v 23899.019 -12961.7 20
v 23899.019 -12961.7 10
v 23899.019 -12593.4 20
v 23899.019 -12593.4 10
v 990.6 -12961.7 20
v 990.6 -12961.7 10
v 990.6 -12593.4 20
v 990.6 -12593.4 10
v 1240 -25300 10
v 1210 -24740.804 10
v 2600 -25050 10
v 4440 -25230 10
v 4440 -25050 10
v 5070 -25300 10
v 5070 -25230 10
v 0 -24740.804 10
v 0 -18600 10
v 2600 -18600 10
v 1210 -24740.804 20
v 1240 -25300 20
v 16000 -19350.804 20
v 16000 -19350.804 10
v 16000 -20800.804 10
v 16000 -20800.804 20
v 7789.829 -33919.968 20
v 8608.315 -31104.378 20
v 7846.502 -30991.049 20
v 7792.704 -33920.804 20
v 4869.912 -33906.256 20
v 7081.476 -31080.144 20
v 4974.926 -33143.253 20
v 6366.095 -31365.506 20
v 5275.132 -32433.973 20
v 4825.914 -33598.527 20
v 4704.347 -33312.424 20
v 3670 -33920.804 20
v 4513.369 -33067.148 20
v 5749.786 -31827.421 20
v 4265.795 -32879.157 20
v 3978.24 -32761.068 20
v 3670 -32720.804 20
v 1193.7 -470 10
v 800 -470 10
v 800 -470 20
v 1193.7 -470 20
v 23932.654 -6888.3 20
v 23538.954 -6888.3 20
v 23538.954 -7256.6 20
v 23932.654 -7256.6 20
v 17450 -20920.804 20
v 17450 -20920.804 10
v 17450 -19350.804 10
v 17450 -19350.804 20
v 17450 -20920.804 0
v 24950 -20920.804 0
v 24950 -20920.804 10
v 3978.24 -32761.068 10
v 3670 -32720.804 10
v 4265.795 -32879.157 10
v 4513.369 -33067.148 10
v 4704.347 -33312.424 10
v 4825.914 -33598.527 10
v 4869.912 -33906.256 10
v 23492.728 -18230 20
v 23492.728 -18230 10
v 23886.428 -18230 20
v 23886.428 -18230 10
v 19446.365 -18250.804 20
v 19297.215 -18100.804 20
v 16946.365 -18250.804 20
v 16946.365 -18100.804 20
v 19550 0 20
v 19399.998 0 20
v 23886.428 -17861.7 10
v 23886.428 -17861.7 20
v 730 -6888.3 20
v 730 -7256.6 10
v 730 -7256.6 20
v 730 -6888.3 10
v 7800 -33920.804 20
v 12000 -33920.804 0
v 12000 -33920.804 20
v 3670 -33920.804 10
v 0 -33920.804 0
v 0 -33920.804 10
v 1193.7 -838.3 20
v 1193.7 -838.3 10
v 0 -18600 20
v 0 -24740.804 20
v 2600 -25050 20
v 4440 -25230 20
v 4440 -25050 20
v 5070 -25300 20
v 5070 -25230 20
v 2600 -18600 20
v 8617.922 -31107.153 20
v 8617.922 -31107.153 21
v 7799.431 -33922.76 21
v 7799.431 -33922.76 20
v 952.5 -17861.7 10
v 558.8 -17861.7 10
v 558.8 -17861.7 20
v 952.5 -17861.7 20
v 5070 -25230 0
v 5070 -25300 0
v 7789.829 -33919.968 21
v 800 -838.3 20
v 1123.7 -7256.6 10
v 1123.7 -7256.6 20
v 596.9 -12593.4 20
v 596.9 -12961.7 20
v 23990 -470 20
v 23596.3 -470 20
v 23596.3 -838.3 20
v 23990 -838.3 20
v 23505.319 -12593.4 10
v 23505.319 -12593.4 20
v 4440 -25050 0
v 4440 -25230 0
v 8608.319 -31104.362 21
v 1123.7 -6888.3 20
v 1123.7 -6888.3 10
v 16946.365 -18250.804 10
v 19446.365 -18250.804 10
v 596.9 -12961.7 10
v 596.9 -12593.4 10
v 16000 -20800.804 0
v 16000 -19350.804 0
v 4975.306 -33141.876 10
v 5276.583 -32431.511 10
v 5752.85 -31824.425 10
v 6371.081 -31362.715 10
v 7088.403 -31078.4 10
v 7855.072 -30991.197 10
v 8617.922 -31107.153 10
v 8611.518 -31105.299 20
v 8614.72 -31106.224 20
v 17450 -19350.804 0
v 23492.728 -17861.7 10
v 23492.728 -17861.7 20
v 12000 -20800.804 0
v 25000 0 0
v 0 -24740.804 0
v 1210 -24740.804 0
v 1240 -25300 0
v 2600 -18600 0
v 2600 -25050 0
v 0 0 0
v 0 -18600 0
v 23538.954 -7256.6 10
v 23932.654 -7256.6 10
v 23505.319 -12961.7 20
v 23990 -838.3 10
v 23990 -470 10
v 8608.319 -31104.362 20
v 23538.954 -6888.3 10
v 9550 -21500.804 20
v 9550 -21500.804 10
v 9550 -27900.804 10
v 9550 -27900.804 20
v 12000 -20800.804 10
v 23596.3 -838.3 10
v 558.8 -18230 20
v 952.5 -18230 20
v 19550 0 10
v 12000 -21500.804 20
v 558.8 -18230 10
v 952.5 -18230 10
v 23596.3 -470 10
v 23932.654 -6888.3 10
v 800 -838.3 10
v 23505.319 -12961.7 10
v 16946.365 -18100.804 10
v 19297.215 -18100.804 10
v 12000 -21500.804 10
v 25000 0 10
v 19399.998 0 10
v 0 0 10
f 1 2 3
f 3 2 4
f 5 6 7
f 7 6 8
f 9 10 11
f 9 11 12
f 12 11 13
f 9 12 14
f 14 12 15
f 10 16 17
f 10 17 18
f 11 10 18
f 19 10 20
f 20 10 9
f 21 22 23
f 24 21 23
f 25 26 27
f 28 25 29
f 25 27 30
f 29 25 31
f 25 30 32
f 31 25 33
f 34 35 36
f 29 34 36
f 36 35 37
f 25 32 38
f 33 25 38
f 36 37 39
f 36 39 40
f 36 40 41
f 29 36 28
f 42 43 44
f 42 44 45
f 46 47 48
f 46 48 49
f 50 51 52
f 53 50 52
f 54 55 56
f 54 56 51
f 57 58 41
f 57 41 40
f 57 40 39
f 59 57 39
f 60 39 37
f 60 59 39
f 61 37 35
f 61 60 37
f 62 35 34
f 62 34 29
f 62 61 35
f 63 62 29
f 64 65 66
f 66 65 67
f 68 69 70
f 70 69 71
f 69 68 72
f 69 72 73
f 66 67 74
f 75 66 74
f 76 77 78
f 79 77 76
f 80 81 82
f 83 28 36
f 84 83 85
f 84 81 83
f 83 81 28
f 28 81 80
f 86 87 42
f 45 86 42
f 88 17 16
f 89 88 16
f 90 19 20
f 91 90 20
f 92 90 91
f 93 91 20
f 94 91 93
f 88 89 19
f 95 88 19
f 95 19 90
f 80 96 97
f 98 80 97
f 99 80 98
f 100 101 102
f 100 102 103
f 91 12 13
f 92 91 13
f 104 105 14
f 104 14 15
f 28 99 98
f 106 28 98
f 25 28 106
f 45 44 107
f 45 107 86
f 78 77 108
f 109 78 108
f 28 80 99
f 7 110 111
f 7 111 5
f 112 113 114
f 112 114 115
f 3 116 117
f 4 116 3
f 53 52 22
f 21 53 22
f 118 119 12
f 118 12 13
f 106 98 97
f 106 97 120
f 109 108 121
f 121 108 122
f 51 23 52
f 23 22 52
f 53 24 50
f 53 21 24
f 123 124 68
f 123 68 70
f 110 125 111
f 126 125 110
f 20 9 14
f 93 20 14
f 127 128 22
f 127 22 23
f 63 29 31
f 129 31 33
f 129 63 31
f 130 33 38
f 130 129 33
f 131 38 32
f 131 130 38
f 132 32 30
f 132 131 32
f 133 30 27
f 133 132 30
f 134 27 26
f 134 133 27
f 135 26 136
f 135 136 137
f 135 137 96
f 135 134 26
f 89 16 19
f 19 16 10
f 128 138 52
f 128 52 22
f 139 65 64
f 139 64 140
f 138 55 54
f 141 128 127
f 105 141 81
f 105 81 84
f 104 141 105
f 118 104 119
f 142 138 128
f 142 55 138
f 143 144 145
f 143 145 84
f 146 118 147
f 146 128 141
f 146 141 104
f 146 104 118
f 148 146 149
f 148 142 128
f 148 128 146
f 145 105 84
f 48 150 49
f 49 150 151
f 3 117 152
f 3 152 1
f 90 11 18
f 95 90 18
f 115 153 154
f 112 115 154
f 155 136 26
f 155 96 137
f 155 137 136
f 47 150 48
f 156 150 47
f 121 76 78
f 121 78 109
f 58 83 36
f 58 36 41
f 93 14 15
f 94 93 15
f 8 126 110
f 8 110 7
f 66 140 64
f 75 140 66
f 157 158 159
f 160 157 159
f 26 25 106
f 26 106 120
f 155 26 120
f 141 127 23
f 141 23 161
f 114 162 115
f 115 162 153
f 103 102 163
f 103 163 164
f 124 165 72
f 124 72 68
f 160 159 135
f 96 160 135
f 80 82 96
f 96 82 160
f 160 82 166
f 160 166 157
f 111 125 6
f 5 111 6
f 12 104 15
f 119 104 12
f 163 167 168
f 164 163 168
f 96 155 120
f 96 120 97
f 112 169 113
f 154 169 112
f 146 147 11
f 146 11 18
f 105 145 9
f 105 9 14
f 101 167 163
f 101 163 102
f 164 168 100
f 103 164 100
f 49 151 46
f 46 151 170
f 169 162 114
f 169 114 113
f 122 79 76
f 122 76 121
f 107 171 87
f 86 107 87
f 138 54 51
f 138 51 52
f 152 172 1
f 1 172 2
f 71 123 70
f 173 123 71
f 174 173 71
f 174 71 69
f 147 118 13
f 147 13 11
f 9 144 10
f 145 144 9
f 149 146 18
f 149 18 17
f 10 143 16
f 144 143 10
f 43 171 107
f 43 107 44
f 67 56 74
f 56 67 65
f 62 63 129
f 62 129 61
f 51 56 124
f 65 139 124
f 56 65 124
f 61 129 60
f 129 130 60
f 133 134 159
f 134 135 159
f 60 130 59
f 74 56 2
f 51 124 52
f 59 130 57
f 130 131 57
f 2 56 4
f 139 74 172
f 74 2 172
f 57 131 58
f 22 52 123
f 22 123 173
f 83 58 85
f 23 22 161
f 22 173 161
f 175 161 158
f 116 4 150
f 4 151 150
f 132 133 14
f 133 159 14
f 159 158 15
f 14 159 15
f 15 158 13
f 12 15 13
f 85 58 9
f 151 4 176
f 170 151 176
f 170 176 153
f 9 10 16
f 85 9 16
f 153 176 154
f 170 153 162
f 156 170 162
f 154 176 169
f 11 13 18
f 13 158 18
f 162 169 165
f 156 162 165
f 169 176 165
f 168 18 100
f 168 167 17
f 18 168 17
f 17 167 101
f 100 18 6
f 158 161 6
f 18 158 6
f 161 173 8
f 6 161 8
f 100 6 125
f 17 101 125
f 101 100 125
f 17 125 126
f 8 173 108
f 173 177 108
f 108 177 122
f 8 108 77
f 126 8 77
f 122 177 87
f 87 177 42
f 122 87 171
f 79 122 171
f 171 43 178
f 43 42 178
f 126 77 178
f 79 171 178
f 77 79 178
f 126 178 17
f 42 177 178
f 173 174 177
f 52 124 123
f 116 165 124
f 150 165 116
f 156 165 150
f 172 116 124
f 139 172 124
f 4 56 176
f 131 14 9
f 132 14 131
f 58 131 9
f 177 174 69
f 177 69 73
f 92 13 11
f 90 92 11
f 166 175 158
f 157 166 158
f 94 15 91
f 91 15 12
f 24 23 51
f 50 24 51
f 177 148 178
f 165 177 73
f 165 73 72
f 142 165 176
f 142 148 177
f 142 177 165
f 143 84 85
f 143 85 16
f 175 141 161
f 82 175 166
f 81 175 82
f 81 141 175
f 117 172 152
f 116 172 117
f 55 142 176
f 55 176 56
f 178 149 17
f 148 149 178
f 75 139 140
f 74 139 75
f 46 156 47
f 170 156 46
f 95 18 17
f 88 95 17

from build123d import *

# Parameters (mm, degrees)
SALIENTE_EXTRUIR1_DEPTH = 10
CROQUIS2_W              = 393.7
CROQUIS2_H              = 368.3
SALIENTE_EXTRUIR2_DEPTH = 10
SALIENTE_EXTRUIR7_DEPTH = 10
EXTRUIR_L_MINA5_DEPTH   = 1


with BuildPart() as part:
    # Croquis1 → Saliente-Extruir1 (new body)
    with BuildSketch(Plane.XY):
        Polygon((0, 0), (25000, 0), (24950, -20920.804148799), (17450, -20920.804148799), (17450, -19350.804148799), (16000, -19350.804148799), (16000, -20800.804148799), (12000, -20800.804148799), (12000, -33920.804148799), (0, -33920.804148799), (0, -24740.804148799), (1210, -24740.804148799), (1240, -25300), (5070, -25300), (5070, -25230), (4440, -25230), (4440, -25050), (2600, -25050), (2600, -18600), (0, -18600), align=None)
    extrude(amount=SALIENTE_EXTRUIR1_DEPTH)

    # Croquis2 → Saliente-Extruir2 (add)
    with BuildSketch(Plane.XY.offset(10)):
        with Locations((996.85, -654.15)):
            Rectangle(CROQUIS2_W, CROQUIS2_H)
        with Locations((926.85, -7072.45)):
            Rectangle(CROQUIS2_W, CROQUIS2_H)
        with Locations((755.65, -18045.85)):
            Rectangle(CROQUIS2_W, CROQUIS2_H)
        with Locations((793.75, -12777.55)):
            Rectangle(CROQUIS2_W, CROQUIS2_H)
        Polygon((19446.365471508, -18250.804148799), (16946.365471508, -18250.804148799), (16946.365471508, -18100.804148799), (19297.214806363, -18100.804148799), (19399.997581742, 0), (19550, 0), align=None)
        Polygon((16000, -20800.804148799), (17450, -20920.804148799), (17450, -19350.804148799), (16000, -19350.804148799), align=None)
        Polygon((12000, -21500.804148799), (9550, -21500.804148799), (9550, -27900.804148799), (7800, -33920.804148799), (12000, -33920.804148799), (12000, -27900.804148799), align=None)
        with BuildLine():
            Line((3670, -33920.804148799), (3670, -32720.804148799))
            ThreePointArc((3670, -32720.804148799), (4518.528137424, -33072.276011376), (4870, -33920.804148799))
            Line((4870, -33920.804148799), (3670, -33920.804148799))
        make_face()
        Polygon((0, -18600), (0, -24740.804148799), (1210, -24740.804148799), (1240, -25300), (5070, -25300), (5070, -25230), (4440, -25230), (4440, -25050), (2600, -25050), (2600, -18600), align=None)
        with Locations((23793.15, -654.15)):
            Rectangle(CROQUIS2_W, CROQUIS2_H)
        with Locations((23735.803977642, -7072.45)):
            Rectangle(CROQUIS2_W, CROQUIS2_H)
        with Locations((23702.168928389, -12777.55)):
            Rectangle(CROQUIS2_W, CROQUIS2_H)
        with Locations((23689.577873183, -18045.85)):
            Rectangle(CROQUIS2_W, CROQUIS2_H)
    extrude(amount=SALIENTE_EXTRUIR2_DEPTH)

    # Croquis3 → Saliente-Extruir7 (add)
    with BuildSketch(Plane.XY.offset(10)):
        with BuildLine():
            Line((7800, -33920.804148799), (4869.875696963, -33920.804148799))
            ThreePointArc((4869.875696963, -33920.804148799), (6040.878653489, -31577.490145193), (8617.921821699, -31107.153082154))
            Line((8617.921821699, -31107.153082154), (7800, -33920.804148799))
        make_face()
    extrude(amount=SALIENTE_EXTRUIR7_DEPTH)

    # Croquis4 → Extruir-Lámina5 (add)
    with BuildSketch(Plane.XY.offset(20)):
        Polygon((8617.921821699, -31107.153082154), (7799.43148405, -33922.759843667), (7789.828986765, -33919.968420037), (8608.319324414, -31104.361658524), align=None)
    extrude(amount=EXTRUIR_L_MINA5_DEPTH)


solid = part.part
